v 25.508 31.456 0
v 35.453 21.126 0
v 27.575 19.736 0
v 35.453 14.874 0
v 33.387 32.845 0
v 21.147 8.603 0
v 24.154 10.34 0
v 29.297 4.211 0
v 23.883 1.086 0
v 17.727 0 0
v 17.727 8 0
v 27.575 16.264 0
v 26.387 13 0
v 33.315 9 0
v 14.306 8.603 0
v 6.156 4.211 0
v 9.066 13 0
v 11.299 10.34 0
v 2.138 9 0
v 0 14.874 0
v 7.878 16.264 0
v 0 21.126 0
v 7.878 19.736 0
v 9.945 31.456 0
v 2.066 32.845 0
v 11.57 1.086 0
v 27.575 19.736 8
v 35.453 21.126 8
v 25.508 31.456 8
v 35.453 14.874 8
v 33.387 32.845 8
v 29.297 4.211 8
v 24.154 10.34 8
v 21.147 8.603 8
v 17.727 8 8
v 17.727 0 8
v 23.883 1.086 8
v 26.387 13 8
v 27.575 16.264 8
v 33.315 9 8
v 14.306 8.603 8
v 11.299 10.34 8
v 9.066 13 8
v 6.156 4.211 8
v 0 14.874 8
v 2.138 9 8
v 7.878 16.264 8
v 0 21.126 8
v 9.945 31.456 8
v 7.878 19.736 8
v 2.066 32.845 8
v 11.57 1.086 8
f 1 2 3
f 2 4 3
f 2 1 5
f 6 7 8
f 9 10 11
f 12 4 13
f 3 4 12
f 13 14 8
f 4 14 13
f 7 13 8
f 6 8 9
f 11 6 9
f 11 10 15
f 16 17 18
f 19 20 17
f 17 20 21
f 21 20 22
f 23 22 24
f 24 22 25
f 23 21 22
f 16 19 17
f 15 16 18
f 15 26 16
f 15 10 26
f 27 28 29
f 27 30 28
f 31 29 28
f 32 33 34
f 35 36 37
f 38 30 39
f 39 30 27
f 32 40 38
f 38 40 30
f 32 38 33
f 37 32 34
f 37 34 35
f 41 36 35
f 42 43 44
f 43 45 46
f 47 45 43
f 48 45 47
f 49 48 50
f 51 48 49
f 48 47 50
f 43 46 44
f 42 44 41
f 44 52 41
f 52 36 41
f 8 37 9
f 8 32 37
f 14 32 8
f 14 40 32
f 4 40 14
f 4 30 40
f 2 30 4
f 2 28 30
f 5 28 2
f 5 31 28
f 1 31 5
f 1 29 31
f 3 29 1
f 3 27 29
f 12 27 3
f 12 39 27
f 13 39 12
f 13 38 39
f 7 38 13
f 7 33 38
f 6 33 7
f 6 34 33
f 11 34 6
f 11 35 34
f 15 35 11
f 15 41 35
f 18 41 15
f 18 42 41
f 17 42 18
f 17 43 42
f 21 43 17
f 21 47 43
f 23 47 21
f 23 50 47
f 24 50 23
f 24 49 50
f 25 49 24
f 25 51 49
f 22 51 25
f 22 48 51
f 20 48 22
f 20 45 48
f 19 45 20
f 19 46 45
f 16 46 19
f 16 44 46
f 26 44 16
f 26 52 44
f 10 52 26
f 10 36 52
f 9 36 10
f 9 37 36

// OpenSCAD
$fn = 32;

// ----------------------------------------------------------------------
// Clip blank: omega clip, 8 mm thick
// ----------------------------------------------------------------------

// --- parameters (mm) ---
profile_height = 8;       // extrusion height
profile_points = 26;      // points of the closed outline

profile = [[0, 21.126], [0, 14.874], [2.138, 9], [6.156, 4.211], [11.57, 1.086], [17.727, 0], [23.883, 1.086], [29.297, 4.211], [33.315, 9], [35.453, 14.874], [35.453, 21.126], [33.387, 32.845], [25.508, 31.456], [27.575, 19.736], [27.575, 16.264], [26.387, 13], [24.154, 10.34], [21.147, 8.603], [17.727, 8], [14.306, 8.603], [11.299, 10.34], [9.066, 13], [7.878, 16.264], [7.878, 19.736], [9.945, 31.456], [2.066, 32.845]];  // single closed polygon, 26 points, counter clockwise

// --- the one profile operation ---
linear_extrude(height = profile_height) polygon(points = profile);
